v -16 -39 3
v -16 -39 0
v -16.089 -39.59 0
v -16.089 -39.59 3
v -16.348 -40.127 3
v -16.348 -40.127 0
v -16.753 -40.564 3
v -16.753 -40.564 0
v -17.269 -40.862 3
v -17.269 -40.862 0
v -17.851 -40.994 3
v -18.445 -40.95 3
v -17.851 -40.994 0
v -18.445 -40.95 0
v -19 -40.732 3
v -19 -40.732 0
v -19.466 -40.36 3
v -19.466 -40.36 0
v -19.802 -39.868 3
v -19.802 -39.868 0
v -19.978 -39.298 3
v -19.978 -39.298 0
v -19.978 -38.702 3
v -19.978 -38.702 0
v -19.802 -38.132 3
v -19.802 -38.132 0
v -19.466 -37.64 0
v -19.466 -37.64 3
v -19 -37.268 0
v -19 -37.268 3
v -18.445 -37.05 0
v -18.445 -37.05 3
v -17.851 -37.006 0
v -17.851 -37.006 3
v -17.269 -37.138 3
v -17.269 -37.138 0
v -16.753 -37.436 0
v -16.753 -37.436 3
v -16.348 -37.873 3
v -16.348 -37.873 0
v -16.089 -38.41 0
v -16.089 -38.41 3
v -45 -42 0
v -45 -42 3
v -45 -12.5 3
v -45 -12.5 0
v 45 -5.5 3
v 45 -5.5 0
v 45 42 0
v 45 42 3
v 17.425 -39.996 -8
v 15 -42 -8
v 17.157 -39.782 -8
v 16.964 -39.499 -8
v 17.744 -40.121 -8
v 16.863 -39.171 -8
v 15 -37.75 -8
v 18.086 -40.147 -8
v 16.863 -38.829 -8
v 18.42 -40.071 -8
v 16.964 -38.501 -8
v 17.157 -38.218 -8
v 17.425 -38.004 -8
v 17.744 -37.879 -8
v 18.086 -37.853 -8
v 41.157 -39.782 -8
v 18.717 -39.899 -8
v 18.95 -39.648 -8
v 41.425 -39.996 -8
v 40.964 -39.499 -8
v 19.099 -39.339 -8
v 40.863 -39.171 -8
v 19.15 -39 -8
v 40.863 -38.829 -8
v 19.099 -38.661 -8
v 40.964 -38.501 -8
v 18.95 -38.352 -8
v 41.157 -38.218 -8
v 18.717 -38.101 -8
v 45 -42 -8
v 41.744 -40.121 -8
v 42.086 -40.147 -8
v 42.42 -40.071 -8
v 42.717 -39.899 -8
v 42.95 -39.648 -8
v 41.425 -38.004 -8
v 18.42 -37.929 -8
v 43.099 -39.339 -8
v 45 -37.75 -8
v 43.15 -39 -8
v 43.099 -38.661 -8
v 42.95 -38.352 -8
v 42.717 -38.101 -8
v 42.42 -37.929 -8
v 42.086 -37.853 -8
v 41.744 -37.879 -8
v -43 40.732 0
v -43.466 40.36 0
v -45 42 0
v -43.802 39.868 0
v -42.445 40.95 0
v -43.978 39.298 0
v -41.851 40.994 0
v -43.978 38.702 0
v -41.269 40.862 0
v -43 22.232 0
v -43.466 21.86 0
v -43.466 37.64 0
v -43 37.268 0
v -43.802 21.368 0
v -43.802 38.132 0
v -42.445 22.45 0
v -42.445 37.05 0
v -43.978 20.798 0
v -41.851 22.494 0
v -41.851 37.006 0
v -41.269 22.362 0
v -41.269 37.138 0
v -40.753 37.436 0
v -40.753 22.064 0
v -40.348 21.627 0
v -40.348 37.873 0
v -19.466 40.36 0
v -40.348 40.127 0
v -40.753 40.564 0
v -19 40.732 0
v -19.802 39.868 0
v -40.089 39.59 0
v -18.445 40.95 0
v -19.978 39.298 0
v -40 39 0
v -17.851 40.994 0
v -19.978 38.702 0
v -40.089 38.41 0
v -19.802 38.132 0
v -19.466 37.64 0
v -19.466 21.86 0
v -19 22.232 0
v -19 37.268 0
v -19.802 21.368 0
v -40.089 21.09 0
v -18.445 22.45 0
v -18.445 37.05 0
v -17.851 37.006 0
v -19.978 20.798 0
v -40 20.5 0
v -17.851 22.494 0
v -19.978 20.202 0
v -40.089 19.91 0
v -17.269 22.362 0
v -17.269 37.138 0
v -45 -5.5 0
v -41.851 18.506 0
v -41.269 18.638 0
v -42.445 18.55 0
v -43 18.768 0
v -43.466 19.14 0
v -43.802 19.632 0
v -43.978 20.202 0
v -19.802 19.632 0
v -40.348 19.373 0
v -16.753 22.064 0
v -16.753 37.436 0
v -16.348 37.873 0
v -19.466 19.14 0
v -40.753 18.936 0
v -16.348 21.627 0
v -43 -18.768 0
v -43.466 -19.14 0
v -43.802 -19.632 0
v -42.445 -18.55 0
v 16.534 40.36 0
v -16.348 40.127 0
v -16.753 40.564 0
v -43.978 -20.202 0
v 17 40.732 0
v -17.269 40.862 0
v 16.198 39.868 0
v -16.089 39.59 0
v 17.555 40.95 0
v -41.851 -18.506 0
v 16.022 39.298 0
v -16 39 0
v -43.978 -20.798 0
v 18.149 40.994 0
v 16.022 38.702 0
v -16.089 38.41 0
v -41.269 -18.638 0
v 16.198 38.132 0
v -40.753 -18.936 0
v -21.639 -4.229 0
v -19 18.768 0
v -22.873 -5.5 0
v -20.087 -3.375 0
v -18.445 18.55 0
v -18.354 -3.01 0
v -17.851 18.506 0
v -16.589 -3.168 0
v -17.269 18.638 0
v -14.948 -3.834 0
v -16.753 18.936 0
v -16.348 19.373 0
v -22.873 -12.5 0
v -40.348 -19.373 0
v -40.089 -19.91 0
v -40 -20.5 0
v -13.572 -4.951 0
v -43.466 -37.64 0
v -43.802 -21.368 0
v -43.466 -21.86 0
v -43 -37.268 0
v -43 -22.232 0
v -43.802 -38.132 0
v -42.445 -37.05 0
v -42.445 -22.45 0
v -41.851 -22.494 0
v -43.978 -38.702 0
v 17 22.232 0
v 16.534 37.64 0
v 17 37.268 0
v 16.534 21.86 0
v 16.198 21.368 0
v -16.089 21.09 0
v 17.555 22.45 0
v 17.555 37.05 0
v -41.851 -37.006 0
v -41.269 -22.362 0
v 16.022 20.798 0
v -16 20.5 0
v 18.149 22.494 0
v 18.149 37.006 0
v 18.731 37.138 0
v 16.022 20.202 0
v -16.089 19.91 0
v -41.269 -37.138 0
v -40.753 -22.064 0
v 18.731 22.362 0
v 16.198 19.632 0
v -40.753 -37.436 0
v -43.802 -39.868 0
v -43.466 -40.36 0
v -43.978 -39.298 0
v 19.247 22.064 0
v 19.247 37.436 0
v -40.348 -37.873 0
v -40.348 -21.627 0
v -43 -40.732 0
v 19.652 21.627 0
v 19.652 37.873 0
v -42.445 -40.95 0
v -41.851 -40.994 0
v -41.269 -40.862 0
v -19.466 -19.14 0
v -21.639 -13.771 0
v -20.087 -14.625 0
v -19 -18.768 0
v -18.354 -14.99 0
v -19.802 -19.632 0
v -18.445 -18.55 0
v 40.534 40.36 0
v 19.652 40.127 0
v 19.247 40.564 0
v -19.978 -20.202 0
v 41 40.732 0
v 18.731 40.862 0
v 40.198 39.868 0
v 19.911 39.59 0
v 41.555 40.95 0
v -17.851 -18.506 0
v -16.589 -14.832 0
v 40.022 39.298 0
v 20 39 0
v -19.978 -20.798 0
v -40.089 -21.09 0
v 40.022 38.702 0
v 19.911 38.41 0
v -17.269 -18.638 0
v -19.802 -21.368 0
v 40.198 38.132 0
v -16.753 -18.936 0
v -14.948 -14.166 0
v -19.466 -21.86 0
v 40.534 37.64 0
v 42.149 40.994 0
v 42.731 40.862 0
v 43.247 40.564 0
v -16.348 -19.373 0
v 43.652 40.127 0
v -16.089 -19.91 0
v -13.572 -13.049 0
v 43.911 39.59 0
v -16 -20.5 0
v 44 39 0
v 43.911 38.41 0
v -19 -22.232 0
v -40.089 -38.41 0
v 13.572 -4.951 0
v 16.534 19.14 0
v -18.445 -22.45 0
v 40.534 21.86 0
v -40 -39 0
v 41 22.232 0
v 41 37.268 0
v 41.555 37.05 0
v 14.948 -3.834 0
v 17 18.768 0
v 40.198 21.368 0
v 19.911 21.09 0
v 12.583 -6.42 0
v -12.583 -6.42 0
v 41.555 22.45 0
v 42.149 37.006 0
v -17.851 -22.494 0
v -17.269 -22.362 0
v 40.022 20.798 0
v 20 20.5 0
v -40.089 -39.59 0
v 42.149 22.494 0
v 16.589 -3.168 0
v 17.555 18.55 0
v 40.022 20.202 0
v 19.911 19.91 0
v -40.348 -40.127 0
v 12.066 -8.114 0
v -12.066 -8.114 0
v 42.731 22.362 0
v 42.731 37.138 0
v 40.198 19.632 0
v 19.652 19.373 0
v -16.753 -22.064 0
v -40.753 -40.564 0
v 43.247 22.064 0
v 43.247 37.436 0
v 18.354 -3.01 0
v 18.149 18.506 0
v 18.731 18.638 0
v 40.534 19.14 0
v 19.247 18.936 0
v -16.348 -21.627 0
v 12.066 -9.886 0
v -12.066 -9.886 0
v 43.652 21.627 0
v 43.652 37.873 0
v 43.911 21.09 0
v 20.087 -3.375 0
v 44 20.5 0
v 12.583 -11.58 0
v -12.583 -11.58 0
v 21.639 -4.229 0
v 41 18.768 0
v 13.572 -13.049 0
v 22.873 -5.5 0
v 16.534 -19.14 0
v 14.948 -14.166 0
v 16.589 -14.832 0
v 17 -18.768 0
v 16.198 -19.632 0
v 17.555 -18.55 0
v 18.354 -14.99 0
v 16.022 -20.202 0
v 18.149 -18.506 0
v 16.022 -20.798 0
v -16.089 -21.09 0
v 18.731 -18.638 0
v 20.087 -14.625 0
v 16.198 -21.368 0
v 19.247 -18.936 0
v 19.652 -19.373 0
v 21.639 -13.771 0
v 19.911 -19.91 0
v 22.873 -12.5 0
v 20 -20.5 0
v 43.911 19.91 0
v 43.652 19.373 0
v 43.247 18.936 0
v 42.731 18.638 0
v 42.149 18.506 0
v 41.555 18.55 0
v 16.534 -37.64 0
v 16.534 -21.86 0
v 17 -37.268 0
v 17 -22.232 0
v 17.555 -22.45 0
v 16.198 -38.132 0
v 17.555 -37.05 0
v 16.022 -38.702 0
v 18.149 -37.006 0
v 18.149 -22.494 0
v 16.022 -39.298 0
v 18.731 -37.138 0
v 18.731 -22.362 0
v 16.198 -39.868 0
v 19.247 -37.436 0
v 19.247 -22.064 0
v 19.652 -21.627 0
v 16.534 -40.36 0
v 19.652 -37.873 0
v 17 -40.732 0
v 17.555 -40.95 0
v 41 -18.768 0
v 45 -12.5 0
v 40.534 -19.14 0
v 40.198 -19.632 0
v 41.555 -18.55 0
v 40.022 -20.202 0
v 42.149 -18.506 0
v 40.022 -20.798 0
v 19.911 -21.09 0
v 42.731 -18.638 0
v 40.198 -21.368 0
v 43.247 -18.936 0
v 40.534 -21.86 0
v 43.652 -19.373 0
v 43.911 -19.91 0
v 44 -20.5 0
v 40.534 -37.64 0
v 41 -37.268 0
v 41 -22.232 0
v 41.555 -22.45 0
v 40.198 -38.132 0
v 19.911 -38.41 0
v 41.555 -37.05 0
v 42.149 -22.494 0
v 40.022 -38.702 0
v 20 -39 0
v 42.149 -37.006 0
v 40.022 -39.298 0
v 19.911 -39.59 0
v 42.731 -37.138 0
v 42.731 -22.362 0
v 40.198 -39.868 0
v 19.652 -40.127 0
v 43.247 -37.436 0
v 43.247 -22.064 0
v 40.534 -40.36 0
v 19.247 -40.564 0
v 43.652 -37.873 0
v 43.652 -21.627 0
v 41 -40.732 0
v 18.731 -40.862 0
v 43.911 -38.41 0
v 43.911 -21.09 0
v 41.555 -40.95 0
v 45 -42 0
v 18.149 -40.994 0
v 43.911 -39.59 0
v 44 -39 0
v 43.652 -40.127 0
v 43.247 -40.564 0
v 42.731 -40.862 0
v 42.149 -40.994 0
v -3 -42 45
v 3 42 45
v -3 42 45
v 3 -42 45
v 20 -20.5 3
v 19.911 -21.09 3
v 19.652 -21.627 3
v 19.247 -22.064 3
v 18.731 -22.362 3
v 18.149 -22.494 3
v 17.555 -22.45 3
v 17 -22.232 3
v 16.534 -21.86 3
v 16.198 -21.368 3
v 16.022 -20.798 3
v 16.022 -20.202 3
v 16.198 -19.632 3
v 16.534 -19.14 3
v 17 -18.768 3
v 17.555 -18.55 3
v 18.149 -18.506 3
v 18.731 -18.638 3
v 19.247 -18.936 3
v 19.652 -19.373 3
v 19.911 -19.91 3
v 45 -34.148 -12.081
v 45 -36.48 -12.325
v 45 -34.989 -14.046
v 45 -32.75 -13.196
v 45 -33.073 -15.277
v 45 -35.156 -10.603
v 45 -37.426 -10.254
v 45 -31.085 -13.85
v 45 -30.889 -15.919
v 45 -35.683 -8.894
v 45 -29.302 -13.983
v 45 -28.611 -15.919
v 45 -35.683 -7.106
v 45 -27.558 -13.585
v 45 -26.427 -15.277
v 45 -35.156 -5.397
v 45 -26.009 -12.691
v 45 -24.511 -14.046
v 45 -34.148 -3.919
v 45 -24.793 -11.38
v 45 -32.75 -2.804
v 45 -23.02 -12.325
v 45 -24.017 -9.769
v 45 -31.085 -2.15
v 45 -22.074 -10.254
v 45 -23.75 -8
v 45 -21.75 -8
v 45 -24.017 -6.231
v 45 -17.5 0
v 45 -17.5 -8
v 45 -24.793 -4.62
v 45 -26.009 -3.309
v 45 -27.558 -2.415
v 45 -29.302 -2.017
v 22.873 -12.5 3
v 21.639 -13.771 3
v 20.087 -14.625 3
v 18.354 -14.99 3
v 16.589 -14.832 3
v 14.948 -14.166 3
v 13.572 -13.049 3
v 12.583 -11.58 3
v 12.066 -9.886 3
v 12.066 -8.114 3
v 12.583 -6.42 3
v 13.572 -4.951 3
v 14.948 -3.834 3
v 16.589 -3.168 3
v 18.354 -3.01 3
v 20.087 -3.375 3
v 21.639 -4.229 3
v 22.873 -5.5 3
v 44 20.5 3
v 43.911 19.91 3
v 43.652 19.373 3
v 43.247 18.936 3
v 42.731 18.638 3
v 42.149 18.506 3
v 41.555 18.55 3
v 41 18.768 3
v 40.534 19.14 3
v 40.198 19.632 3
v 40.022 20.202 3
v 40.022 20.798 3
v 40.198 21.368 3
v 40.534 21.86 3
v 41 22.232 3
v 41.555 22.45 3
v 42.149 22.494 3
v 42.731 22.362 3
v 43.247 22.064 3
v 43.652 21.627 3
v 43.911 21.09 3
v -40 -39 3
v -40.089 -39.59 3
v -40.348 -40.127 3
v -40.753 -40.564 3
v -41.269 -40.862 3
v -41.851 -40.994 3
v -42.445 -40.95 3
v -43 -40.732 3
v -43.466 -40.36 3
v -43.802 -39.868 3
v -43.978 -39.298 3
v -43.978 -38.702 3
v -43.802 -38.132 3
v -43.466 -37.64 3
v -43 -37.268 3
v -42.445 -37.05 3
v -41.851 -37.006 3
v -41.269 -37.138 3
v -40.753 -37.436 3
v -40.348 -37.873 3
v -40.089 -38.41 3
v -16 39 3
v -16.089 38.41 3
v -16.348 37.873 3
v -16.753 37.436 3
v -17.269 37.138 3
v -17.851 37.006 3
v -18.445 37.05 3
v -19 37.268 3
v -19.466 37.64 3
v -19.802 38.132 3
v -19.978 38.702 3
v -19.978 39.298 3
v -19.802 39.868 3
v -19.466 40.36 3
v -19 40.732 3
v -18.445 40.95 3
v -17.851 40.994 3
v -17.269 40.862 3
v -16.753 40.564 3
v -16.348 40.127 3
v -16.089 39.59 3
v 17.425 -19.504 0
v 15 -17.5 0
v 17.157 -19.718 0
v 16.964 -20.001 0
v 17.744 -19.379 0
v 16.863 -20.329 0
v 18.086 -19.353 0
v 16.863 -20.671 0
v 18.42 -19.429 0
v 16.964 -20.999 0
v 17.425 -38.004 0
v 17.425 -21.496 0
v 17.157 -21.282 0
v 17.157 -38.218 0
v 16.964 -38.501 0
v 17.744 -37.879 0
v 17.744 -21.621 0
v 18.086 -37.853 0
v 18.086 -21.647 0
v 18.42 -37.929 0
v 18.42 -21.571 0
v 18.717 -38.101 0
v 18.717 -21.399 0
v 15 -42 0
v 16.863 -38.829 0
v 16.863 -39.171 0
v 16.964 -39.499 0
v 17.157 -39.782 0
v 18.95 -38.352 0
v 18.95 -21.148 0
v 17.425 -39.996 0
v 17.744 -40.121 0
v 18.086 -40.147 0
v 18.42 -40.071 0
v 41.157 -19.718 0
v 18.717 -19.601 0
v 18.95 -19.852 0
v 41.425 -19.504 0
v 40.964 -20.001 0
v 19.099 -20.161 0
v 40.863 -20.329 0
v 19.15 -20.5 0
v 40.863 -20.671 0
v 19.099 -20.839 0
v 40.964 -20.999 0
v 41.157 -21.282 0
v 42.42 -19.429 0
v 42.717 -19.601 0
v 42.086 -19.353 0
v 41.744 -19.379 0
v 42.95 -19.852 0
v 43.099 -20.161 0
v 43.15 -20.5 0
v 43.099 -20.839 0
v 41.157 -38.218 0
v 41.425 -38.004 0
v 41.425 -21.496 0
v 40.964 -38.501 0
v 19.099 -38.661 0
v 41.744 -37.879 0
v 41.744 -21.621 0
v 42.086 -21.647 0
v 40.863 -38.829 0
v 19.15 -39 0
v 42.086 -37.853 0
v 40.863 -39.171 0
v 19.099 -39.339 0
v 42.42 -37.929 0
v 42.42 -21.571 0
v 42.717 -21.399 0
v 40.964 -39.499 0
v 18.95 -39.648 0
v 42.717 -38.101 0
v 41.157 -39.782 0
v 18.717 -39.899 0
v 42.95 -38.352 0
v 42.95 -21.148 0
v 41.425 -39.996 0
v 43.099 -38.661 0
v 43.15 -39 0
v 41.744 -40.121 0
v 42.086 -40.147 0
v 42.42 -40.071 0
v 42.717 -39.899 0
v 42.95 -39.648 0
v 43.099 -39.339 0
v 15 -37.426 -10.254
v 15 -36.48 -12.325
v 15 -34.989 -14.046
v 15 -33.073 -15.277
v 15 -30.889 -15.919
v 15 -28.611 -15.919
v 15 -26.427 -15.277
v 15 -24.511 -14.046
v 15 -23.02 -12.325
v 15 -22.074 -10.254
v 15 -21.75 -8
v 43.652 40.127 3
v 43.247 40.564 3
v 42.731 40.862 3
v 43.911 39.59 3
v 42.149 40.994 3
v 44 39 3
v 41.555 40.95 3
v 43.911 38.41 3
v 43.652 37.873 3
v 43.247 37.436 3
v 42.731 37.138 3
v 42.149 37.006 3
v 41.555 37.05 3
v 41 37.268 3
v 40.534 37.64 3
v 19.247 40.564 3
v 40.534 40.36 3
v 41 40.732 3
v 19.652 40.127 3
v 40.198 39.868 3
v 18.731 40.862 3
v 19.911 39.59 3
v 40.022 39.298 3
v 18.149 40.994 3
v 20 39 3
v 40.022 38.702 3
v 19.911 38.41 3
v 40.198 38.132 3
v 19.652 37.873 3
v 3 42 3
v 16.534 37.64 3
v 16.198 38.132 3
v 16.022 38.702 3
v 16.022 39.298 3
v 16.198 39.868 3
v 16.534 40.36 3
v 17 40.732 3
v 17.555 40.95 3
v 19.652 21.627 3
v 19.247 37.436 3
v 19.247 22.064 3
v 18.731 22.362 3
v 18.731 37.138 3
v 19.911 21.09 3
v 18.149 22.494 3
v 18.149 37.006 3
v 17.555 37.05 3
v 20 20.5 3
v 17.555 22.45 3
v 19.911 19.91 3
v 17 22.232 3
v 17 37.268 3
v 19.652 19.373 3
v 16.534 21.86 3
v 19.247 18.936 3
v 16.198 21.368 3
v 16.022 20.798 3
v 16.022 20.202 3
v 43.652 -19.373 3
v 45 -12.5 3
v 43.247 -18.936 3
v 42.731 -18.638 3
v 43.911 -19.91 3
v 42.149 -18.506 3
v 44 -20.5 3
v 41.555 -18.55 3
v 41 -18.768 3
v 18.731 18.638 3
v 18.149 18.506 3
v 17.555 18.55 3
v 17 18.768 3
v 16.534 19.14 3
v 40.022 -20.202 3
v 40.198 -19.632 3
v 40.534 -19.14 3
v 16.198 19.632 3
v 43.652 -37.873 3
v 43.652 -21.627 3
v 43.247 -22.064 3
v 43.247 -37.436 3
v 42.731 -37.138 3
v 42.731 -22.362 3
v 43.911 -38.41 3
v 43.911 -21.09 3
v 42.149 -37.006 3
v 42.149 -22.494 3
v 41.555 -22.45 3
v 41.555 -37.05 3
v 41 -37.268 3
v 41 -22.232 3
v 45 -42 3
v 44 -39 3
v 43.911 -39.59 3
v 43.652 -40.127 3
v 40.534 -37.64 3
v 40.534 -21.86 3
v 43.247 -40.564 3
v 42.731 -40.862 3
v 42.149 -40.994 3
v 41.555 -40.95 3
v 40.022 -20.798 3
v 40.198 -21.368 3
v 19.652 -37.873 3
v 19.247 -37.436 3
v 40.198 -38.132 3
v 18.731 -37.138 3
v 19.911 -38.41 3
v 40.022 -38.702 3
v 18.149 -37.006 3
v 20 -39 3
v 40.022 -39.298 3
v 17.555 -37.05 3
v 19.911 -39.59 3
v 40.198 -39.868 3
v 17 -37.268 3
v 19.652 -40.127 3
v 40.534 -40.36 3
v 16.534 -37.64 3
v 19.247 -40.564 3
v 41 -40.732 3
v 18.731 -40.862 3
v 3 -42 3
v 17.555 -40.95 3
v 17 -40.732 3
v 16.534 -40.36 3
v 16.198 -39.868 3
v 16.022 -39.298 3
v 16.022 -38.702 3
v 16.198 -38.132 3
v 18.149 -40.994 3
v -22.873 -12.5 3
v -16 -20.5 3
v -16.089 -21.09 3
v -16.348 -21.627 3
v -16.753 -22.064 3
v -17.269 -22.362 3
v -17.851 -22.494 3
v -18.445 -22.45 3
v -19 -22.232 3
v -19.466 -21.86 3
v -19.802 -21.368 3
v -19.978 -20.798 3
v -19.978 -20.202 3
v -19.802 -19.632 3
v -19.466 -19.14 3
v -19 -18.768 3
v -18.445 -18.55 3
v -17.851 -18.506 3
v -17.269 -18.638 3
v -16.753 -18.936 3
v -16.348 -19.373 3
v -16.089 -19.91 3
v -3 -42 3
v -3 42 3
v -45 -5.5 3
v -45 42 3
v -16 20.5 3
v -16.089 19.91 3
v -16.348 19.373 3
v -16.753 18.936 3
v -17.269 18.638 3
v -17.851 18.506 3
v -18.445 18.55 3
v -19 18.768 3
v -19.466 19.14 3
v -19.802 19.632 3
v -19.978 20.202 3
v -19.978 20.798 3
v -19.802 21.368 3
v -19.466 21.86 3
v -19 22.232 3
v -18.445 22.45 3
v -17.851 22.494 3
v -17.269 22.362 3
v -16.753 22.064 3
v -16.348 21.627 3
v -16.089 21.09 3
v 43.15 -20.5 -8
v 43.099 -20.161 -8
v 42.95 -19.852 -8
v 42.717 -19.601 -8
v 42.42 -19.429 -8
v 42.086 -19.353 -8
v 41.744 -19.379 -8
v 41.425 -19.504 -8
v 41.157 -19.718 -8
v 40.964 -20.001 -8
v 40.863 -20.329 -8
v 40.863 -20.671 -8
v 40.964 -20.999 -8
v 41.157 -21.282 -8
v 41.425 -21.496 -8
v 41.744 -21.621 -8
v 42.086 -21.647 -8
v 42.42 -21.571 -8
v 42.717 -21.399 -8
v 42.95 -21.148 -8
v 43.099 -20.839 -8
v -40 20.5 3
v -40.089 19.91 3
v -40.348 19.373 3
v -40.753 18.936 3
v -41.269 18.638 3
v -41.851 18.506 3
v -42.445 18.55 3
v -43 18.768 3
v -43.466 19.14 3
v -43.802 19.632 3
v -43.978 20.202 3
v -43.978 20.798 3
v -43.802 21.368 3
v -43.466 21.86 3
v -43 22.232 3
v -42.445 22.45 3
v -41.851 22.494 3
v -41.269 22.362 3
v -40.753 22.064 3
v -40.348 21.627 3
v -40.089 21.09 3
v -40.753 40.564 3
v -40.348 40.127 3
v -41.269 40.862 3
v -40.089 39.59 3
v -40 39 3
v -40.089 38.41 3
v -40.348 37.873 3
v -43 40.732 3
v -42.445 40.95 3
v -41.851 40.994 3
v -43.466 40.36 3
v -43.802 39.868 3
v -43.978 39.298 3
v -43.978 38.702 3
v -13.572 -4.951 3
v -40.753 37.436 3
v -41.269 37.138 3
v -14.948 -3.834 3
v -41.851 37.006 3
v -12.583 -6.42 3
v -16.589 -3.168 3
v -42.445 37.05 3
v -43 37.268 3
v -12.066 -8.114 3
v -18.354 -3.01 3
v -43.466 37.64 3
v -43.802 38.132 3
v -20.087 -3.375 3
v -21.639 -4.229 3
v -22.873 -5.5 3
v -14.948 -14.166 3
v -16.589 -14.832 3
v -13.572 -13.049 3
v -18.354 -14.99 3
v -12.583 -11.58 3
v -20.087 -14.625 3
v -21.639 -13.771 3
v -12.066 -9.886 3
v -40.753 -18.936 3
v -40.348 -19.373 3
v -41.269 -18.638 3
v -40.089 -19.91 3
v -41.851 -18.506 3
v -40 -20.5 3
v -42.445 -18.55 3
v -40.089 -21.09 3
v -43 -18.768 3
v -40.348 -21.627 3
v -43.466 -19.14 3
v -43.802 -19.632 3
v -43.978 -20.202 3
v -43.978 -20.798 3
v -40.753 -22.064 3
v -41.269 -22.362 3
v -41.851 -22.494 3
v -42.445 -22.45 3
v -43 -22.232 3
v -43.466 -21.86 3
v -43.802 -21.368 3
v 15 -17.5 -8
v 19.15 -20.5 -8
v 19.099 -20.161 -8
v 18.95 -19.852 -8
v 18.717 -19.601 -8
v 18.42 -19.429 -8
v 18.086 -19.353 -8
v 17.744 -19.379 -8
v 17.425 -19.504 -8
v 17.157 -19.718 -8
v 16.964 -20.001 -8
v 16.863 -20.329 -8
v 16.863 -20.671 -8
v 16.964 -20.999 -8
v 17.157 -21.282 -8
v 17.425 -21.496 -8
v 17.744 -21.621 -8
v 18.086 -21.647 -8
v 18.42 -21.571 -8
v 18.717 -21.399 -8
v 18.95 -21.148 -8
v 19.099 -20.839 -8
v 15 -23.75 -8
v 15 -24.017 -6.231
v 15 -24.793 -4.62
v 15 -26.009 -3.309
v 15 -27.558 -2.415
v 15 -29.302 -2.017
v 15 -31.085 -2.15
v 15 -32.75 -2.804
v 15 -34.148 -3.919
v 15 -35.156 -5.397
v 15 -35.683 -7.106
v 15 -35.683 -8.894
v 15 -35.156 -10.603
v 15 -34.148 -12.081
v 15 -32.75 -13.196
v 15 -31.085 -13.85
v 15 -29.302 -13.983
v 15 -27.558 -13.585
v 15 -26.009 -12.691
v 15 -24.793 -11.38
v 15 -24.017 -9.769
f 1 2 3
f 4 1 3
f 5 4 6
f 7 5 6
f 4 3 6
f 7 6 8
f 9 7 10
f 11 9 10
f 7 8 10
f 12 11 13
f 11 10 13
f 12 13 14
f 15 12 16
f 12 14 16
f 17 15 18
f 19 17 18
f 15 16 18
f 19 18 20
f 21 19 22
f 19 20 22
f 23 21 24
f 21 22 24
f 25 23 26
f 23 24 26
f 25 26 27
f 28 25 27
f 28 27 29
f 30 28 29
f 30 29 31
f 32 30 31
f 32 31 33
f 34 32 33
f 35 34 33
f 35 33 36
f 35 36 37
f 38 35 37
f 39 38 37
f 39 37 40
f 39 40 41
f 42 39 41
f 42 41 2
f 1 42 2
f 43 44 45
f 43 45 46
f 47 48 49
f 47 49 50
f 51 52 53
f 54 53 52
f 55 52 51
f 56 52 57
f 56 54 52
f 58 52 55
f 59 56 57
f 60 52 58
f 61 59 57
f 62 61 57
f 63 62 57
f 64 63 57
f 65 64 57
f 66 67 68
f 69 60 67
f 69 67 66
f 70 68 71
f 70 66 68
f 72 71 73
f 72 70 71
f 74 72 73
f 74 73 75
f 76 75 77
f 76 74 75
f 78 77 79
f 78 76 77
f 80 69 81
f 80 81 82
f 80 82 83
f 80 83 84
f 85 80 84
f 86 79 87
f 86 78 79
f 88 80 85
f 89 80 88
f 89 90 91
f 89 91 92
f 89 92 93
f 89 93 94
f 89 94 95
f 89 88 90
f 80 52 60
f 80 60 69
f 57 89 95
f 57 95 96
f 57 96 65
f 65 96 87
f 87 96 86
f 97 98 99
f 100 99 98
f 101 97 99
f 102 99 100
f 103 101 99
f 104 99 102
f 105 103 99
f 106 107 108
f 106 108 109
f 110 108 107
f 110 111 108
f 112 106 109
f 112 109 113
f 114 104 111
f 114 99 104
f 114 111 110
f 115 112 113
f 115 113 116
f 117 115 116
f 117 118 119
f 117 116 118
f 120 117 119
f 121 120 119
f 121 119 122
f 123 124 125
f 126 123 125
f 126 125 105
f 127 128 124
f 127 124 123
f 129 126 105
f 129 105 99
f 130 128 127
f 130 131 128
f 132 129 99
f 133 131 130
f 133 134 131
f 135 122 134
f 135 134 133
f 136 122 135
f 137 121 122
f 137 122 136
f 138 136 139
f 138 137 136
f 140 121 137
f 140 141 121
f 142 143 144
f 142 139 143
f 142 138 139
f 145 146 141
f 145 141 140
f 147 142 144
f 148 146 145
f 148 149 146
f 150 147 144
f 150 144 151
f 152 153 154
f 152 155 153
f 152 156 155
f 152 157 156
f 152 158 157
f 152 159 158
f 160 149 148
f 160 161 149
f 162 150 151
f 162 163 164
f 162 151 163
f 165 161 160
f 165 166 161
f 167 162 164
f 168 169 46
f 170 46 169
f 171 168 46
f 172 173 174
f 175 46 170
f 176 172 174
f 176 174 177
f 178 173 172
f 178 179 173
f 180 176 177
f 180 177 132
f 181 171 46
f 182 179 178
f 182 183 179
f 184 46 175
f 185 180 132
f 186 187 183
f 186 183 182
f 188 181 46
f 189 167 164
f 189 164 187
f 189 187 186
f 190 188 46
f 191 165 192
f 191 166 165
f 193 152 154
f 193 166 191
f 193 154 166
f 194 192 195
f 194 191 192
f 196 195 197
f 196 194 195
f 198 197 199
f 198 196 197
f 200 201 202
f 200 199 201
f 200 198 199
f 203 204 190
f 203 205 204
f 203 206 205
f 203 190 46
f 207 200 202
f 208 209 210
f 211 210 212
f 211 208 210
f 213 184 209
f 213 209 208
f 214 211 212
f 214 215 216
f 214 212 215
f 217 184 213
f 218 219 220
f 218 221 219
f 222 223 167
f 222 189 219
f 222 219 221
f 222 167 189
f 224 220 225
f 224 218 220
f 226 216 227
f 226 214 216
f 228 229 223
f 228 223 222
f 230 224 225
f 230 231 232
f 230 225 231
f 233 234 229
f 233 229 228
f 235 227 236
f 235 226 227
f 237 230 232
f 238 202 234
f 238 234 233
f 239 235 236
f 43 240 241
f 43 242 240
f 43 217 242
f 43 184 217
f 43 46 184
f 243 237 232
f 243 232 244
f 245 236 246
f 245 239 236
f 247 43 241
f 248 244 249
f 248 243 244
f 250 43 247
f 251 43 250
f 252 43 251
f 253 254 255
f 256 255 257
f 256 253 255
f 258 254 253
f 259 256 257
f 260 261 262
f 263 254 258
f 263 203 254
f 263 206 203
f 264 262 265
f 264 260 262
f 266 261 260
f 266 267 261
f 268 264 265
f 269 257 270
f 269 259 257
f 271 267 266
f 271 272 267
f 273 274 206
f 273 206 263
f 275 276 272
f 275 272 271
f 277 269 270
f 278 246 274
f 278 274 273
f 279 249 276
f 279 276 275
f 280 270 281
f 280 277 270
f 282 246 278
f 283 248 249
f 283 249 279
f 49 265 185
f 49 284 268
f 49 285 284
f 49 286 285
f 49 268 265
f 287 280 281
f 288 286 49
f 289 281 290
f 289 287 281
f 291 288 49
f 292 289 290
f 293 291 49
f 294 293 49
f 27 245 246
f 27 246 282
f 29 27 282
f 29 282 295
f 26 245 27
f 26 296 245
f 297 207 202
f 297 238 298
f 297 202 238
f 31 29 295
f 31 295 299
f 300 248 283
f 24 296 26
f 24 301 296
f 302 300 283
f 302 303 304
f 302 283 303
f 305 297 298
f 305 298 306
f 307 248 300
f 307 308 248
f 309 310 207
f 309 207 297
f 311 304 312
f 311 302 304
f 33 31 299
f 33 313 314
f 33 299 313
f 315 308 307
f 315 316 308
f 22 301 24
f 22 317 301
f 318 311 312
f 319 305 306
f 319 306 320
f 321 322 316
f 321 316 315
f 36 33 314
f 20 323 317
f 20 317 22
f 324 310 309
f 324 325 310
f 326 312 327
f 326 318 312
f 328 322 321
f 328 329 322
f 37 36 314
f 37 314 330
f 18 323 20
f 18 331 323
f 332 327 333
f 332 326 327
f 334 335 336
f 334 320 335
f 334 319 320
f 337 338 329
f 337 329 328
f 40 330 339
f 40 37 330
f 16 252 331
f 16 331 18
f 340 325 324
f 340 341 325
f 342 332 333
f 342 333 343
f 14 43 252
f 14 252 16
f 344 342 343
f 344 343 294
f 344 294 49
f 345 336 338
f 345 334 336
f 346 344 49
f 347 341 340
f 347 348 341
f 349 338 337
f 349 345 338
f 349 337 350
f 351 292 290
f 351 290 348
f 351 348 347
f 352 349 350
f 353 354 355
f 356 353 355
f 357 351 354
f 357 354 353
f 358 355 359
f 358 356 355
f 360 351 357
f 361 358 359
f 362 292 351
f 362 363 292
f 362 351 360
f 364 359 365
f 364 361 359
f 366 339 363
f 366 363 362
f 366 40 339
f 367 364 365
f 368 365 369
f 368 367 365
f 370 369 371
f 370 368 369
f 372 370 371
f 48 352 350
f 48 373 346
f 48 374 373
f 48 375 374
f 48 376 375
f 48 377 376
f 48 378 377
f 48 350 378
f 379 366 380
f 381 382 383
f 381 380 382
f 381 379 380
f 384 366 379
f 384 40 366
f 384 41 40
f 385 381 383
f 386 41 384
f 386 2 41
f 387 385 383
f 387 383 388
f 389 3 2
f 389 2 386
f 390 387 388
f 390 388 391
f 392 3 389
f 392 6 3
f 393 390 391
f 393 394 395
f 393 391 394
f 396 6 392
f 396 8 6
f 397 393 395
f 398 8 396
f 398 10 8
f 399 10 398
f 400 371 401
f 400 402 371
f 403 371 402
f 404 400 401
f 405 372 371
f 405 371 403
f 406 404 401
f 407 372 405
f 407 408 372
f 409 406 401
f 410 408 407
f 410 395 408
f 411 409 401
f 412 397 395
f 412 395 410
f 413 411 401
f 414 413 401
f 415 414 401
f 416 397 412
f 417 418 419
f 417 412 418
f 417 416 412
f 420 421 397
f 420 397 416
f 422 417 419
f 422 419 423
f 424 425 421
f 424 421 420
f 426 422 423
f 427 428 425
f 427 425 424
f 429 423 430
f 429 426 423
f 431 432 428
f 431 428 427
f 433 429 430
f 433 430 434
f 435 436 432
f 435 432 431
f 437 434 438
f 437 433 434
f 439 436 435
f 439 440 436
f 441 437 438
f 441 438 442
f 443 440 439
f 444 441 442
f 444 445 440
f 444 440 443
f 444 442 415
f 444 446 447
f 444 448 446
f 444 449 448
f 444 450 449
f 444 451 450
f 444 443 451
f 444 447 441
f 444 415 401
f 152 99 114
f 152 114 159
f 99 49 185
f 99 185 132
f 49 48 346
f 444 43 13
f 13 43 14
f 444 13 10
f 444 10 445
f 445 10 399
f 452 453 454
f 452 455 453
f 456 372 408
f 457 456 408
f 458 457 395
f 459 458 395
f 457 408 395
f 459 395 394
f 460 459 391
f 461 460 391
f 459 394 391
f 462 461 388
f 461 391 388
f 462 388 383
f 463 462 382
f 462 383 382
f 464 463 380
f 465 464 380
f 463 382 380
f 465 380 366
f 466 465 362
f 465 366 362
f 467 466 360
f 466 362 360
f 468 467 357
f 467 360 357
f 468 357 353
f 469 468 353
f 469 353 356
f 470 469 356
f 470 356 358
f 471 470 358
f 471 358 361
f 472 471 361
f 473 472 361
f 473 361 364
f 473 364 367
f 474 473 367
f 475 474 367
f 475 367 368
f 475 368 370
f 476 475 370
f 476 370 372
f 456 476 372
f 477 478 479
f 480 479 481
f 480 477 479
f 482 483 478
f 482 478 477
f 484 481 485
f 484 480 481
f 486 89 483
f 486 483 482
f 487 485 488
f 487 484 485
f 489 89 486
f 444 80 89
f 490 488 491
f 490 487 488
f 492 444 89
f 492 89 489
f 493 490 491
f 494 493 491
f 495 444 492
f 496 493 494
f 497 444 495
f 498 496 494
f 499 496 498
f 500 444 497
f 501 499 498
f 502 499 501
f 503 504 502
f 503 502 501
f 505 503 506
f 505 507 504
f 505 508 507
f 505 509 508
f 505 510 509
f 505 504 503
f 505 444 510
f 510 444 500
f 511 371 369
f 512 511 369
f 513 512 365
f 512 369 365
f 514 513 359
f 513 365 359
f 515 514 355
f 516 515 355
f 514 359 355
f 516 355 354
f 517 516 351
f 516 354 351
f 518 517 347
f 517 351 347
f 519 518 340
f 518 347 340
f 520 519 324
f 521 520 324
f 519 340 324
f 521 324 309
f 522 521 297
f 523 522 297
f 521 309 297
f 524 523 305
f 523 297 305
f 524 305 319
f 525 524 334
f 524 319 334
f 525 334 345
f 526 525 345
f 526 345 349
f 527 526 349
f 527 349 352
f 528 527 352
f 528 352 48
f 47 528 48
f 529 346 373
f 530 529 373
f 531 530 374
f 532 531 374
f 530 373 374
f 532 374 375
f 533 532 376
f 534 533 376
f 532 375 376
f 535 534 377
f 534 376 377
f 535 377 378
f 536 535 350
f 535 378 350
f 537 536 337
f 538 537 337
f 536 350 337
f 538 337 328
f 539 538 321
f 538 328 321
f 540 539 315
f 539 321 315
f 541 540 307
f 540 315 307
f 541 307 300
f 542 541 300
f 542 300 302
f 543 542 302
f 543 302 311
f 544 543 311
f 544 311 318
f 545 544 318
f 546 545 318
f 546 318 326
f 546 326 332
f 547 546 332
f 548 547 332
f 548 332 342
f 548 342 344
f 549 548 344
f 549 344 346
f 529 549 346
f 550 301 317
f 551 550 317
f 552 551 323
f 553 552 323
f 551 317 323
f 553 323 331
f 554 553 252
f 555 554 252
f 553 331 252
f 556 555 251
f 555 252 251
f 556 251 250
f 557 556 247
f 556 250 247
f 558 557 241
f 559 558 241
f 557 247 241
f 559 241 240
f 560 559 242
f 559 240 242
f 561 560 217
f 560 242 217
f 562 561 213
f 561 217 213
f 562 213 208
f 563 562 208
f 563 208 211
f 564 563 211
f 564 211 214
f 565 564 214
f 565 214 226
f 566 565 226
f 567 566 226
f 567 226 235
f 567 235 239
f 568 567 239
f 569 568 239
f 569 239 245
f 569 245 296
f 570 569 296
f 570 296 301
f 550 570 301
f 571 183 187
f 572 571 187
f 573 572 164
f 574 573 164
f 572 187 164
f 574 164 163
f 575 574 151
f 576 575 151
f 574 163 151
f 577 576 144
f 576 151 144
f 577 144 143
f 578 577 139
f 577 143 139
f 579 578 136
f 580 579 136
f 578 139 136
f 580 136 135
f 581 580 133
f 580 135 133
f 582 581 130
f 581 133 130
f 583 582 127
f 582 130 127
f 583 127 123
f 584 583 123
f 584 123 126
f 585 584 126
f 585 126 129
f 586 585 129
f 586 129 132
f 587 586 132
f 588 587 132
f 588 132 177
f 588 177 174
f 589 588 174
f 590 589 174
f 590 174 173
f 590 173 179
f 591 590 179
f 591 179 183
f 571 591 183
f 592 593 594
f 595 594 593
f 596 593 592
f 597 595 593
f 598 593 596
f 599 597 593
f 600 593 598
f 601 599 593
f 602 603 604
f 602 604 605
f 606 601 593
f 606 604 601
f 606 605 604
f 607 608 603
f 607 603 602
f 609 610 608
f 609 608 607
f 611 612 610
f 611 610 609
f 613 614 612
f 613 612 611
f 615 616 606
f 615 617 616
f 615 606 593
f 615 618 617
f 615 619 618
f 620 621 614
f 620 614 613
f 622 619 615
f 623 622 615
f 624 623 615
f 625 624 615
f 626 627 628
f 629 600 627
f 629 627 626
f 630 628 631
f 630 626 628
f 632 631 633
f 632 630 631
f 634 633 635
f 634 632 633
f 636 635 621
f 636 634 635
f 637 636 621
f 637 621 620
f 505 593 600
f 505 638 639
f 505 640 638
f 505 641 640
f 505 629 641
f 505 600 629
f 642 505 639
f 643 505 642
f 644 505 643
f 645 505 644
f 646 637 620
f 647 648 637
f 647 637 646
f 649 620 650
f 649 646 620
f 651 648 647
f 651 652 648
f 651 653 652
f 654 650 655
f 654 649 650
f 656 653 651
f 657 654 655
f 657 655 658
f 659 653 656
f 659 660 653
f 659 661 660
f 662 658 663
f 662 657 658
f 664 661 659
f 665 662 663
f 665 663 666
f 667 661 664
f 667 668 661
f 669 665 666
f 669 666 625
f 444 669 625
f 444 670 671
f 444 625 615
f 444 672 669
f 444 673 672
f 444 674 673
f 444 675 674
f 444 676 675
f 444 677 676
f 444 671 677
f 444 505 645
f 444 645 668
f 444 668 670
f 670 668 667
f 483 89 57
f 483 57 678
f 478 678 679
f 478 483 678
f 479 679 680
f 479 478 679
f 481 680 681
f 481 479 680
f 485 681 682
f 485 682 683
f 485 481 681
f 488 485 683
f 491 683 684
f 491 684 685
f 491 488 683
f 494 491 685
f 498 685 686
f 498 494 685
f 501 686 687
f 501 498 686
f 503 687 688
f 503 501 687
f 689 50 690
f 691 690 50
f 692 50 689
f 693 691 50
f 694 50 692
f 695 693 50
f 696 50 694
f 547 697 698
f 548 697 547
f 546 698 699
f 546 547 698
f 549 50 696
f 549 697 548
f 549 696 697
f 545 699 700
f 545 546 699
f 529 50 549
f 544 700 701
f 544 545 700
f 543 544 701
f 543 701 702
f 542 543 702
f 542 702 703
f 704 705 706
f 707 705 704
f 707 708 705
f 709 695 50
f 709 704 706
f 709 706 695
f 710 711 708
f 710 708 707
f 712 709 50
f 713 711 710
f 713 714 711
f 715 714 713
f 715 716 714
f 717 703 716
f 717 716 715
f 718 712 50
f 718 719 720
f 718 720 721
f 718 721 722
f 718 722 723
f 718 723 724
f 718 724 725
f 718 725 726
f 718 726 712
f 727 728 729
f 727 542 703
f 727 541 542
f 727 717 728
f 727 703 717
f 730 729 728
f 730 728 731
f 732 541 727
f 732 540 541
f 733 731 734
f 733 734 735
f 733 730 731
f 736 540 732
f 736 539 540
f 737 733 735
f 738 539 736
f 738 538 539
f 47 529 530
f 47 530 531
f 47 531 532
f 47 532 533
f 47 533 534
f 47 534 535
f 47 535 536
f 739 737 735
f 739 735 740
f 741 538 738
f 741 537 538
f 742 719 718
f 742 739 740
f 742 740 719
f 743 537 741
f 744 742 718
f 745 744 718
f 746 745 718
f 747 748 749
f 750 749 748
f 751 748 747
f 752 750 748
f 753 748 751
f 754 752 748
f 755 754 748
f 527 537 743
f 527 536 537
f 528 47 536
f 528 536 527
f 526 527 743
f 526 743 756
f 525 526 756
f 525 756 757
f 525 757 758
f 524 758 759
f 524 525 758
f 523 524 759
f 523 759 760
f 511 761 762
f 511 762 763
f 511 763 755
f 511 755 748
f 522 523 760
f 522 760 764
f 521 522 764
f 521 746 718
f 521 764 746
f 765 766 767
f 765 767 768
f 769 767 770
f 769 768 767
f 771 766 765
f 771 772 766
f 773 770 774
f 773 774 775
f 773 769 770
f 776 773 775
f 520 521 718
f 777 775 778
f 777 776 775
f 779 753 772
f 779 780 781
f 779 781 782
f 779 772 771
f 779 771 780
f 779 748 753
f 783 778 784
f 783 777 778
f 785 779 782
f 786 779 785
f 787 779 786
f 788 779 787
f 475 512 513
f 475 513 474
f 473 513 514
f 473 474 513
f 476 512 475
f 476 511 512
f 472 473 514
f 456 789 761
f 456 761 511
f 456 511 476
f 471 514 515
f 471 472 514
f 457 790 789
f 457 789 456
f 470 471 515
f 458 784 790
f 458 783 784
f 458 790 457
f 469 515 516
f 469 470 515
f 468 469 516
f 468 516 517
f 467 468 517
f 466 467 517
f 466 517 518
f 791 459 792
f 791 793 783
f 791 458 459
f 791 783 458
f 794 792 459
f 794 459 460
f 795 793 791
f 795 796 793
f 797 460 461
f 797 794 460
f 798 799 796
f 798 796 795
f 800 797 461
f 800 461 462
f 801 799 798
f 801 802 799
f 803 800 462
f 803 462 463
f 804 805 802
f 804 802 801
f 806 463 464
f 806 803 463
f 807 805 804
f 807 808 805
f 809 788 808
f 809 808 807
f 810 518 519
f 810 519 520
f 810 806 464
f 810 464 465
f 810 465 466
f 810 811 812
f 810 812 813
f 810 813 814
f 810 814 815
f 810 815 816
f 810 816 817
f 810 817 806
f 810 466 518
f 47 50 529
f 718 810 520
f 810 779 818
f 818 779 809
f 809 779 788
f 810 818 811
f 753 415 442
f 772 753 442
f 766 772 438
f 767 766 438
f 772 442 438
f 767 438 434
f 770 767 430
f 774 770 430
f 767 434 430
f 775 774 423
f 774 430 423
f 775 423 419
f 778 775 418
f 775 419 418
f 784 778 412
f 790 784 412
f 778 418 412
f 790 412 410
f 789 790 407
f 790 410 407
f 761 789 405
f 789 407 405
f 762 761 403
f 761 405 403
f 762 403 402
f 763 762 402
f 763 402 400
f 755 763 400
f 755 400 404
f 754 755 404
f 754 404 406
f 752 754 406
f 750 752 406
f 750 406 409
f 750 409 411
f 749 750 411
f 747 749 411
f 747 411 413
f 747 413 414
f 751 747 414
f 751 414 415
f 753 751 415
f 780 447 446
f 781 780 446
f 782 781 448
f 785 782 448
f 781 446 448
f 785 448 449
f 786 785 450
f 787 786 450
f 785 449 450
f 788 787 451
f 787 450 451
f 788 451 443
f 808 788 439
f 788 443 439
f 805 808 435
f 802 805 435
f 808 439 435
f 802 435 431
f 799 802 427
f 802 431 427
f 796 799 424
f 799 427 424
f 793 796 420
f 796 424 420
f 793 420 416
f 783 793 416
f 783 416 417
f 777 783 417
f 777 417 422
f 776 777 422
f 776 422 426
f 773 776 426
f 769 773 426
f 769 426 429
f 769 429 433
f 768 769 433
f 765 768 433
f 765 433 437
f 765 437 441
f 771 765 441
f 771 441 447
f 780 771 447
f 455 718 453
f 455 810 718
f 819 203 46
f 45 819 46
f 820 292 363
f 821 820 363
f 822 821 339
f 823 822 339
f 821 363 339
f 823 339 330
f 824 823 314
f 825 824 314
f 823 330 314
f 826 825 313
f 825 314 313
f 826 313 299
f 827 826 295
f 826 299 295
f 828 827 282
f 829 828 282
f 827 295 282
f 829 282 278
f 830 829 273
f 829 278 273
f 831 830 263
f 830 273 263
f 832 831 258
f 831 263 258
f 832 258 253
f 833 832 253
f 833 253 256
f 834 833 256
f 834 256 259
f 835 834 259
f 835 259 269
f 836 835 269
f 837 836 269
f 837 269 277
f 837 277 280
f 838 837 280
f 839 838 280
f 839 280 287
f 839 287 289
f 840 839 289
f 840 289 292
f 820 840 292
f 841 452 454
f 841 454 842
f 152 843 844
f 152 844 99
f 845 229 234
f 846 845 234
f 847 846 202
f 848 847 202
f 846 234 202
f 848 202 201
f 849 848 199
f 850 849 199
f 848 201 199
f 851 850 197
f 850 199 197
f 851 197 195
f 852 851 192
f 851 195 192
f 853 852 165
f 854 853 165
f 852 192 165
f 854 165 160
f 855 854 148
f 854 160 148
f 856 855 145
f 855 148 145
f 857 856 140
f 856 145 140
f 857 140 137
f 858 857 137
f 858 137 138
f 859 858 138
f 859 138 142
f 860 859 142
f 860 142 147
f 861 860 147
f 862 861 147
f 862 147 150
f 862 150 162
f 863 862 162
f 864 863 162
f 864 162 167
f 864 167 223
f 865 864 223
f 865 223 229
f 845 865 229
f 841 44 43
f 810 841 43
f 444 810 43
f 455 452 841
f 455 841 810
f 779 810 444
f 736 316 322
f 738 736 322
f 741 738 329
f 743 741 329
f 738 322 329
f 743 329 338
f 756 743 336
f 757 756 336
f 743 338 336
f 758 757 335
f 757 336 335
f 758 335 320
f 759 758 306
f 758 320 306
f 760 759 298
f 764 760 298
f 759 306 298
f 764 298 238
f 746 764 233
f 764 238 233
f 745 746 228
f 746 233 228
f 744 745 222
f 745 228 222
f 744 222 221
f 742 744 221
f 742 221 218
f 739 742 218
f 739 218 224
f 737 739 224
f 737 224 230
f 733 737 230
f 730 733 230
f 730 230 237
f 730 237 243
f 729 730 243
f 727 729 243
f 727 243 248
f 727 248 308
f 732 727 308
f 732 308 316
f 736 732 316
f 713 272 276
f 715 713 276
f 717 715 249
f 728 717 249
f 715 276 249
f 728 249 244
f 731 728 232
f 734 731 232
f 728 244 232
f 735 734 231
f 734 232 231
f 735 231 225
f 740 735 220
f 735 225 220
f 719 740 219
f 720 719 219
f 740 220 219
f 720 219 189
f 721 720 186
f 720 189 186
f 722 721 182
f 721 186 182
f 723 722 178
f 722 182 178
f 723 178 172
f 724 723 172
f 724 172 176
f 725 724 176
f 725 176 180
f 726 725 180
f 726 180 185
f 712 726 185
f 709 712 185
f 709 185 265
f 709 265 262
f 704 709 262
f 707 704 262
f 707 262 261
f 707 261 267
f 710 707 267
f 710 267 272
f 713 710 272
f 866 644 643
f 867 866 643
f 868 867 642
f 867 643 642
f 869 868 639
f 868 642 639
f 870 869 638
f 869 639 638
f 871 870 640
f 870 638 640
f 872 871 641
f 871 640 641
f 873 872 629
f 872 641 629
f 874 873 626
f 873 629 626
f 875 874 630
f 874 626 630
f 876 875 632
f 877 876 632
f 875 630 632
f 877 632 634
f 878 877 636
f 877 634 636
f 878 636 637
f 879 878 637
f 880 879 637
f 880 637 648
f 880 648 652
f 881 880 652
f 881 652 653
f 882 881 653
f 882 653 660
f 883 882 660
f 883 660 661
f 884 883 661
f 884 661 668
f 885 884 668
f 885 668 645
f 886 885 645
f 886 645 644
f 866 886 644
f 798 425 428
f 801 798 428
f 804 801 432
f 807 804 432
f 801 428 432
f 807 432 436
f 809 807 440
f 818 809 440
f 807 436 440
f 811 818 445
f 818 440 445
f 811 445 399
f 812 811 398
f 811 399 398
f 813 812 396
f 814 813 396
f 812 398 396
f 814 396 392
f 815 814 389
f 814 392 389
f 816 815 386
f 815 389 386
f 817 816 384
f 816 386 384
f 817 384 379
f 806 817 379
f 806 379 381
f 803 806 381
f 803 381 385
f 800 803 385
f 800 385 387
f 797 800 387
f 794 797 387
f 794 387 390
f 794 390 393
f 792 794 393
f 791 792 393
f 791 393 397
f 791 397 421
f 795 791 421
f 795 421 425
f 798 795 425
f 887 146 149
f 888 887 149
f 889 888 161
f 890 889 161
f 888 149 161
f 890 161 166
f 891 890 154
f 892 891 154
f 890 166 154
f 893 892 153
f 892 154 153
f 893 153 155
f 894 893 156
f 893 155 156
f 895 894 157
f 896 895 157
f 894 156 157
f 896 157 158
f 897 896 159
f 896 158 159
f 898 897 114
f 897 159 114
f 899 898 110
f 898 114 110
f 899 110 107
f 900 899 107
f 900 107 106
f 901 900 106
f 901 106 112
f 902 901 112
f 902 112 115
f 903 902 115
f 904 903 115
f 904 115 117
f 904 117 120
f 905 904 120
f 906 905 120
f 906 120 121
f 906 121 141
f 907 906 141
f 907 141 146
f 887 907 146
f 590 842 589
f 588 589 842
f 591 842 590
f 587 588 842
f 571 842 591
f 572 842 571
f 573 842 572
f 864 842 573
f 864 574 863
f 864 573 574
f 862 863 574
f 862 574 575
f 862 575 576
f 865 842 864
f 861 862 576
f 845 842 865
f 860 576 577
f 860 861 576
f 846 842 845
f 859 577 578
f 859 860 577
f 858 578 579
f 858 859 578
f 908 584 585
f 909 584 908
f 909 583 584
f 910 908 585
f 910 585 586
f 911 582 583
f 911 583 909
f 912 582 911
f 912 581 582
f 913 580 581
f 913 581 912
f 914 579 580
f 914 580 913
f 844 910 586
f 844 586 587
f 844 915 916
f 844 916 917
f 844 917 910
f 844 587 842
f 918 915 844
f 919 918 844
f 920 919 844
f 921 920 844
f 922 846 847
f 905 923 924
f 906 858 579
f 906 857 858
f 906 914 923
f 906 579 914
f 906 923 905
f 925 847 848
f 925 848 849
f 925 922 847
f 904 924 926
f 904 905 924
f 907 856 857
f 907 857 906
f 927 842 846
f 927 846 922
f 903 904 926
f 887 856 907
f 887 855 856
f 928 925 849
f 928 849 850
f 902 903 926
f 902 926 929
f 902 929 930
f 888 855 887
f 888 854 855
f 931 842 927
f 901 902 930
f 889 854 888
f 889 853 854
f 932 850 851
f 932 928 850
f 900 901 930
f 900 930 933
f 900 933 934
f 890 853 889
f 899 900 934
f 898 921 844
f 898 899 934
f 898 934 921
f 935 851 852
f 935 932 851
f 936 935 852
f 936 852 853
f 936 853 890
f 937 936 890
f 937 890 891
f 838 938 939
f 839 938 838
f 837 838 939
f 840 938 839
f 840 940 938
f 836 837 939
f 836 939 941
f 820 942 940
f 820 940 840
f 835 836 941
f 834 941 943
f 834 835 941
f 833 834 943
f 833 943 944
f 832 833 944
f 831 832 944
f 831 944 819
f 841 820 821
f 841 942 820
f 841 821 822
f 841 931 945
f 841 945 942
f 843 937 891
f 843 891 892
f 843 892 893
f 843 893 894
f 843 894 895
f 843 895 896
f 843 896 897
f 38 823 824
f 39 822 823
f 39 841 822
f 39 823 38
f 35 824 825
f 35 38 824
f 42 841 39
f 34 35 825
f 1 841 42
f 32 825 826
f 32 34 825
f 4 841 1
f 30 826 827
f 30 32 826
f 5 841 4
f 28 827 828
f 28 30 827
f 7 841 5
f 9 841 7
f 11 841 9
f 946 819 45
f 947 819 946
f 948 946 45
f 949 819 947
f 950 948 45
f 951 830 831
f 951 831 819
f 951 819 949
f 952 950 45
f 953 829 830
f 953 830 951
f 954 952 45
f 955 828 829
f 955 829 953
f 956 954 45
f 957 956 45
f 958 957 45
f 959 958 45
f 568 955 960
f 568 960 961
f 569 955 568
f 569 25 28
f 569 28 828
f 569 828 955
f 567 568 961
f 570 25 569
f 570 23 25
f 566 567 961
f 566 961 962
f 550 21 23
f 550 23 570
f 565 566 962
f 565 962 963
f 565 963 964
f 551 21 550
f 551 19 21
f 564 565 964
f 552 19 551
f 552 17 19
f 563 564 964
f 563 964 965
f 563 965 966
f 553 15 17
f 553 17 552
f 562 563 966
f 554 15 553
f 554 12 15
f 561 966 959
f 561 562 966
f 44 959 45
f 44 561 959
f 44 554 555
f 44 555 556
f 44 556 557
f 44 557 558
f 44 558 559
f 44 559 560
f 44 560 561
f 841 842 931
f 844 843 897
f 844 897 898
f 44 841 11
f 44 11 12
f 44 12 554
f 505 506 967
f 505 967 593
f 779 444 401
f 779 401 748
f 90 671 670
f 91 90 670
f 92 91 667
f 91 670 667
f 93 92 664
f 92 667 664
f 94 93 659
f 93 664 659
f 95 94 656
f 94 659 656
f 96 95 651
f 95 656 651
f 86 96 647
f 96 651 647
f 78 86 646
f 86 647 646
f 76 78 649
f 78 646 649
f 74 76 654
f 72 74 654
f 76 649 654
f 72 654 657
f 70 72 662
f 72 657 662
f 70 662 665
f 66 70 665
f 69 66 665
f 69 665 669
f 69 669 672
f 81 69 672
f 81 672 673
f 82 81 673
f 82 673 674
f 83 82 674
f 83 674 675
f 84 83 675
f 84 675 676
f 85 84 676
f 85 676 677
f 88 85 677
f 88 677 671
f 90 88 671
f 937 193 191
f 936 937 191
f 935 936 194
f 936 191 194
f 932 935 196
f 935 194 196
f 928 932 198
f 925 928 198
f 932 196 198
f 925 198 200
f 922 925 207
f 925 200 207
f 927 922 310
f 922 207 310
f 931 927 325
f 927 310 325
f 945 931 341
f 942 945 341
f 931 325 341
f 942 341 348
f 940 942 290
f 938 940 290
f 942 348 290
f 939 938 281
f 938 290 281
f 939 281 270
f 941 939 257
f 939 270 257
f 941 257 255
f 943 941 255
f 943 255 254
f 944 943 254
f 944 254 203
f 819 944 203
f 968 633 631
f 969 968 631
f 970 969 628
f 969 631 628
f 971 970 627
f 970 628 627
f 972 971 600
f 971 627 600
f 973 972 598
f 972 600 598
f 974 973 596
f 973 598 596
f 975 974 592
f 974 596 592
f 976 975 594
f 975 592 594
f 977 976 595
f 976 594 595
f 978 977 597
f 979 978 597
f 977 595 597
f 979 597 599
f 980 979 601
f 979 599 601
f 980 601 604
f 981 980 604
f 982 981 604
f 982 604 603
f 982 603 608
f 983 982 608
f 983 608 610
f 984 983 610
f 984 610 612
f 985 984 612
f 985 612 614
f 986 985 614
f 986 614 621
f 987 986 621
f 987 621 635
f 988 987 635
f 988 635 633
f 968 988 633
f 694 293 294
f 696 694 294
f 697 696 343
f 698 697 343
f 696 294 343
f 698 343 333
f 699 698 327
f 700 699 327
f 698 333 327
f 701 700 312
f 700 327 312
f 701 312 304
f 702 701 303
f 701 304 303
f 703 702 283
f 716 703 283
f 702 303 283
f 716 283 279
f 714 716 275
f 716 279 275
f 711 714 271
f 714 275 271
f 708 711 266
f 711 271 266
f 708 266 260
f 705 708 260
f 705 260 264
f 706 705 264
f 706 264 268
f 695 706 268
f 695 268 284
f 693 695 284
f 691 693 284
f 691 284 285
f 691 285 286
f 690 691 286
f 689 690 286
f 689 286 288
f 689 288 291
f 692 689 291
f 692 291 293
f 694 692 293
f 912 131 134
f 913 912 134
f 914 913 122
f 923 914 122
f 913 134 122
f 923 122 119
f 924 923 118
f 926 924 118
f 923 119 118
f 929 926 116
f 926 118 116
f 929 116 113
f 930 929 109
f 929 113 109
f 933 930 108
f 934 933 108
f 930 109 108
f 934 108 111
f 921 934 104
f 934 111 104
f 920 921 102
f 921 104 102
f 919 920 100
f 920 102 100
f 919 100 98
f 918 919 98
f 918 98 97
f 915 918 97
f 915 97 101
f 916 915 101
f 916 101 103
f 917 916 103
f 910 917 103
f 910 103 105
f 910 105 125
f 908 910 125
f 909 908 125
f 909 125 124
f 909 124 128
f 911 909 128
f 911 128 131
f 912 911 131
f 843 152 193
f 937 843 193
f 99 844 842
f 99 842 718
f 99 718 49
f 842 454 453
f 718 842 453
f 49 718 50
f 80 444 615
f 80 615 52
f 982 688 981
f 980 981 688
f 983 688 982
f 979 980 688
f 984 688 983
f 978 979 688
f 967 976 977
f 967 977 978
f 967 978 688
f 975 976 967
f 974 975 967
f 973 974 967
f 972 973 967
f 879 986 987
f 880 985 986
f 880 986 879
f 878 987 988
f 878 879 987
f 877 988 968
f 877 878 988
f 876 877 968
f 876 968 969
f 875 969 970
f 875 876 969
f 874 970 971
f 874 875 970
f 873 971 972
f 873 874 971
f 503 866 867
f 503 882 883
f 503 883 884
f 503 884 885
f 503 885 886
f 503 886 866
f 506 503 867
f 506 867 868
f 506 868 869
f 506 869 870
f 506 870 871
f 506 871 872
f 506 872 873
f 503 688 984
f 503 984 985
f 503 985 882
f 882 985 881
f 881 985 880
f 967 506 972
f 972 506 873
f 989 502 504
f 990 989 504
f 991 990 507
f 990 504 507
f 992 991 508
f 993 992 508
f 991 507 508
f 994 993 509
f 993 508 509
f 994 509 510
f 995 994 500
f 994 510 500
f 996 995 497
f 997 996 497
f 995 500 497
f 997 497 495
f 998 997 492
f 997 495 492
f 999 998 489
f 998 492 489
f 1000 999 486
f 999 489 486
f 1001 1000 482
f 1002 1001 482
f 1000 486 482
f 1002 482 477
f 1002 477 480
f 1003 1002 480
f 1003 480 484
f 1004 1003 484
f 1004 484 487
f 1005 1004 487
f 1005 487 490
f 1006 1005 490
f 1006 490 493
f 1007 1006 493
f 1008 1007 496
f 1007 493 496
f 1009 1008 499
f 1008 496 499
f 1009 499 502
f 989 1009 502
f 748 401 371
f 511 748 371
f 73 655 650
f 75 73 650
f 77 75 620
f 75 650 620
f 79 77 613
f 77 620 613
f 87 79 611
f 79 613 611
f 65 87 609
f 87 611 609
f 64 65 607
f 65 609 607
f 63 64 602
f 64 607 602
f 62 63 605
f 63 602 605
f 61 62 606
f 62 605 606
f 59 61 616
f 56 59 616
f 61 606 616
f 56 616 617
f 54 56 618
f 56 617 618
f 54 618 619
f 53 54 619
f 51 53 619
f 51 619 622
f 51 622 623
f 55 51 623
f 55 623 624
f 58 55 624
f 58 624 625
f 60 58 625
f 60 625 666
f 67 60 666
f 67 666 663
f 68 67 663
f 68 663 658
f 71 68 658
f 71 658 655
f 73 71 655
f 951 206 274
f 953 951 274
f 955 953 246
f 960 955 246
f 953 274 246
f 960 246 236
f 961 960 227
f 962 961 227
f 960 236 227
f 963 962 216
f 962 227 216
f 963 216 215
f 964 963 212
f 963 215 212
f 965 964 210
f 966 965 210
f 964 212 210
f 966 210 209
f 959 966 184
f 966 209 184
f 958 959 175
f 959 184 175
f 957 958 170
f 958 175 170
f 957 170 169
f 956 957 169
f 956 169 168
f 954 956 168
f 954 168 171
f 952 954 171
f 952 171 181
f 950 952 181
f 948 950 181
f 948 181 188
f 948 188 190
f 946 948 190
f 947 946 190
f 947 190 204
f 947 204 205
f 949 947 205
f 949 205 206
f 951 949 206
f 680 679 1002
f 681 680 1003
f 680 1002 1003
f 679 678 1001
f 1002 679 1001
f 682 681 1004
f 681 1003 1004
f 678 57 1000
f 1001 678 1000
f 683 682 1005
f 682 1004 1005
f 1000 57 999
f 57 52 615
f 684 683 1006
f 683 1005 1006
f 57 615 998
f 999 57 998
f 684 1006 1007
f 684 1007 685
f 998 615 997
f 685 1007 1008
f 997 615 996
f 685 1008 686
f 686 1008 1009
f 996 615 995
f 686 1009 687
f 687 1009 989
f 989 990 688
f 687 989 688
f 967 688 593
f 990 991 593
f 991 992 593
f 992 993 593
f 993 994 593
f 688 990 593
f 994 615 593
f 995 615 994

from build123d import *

# Parameters (mm, degrees)
F1_DEPTH = 42
F3_DEPTH = 45.001
F4_R     = 6
F5_DEPTH = 30
F6_R     = 1.15
F7_DEPTH = 16.001
F8_R     = 2
F9_DEPTH = 45.001


with BuildPart() as f1:
    # F0 (on Front) → F1 (new body, symmetric)
    with BuildSketch(Plane.XZ):
        Polygon((3, 45), (0, 45), (0, 0), (45, 0), (45, 3), (3, 3), align=None)
        Polygon((0, 0), (0, 45), (-3, 45), (-3, 3), (-45, 3), (-45, 0), align=None)
    extrude(amount=F1_DEPTH, both=True)

    # F2 (on face) → F3 (cut, through all)
    with BuildSketch(Plane(origin=(0, 0, 0), x_dir=(1, 0, 0), z_dir=(0, 0, -1))):
        with BuildLine():
            Line((45, 12.5), (22.873397, 12.5))
            ThreePointArc((22.873397, 12.5), (12, 9), (22.873397, 5.5))
            Line((22.873397, 5.5), (45, 5.5))
            Line((45, 5.5), (45, 12.5))
        make_face()
        with BuildLine():
            ThreePointArc((-22.873397, 5.5), (-12, 9), (-22.873397, 12.5))
            Line((-22.873397, 12.5), (-45, 12.5))
            Line((-45, 12.5), (-45, 5.5))
            Line((-45, 5.5), (-22.873397, 5.5))
        make_face()
    extrude(amount=-F3_DEPTH, mode=Mode.SUBTRACT)

    # F8 (on face) → F9 (cut, through all)
    with BuildSketch(Plane(origin=(0, 0, 0), x_dir=(1, 0, 0), z_dir=(0, 0, -1))):
        with Locations((18, 20.5)):
            Circle(F8_R)
        with Locations((18, 39)):
            Circle(F8_R)
        with Locations((42, 20.5)):
            Circle(F8_R)
        with Locations((42, 39)):
            Circle(F8_R)
        with Locations((18, -20.5)):
            Circle(F8_R)
        with Locations((18, -39)):
            Circle(F8_R)
        with Locations((42, -20.5)):
            Circle(F8_R)
        with Locations((42, -39)):
            Circle(F8_R)
        with Locations((-42, -39)):
            Circle(F8_R)
        with Locations((-42, -20.5)):
            Circle(F8_R)
        with Locations((-18, -39)):
            Circle(F8_R)
        with Locations((-18, -20.5)):
            Circle(F8_R)
        with Locations((-42, 39)):
            Circle(F8_R)
        with Locations((-42, 20.5)):
            Circle(F8_R)
        with Locations((-18, 39)):
            Circle(F8_R)
        with Locations((-18, 20.5)):
            Circle(F8_R)
    extrude(amount=-F9_DEPTH, mode=Mode.SUBTRACT)


with BuildPart() as f5:
    # F4 (on face) → F5 (new body)
    with BuildSketch(Plane.YZ.offset(45)):
        with BuildLine():
            Line((-17.5, 0), (-42, 0))
            Line((-42, 0), (-42, -8))
            Line((-42, -8), (-37.75, -8))
            ThreePointArc((-37.75, -8), (-29.75, -16), (-21.75, -8))
            Line((-21.75, -8), (-17.5, -8))
            Line((-17.5, -8), (-17.5, 0))
        make_face()
        with Locations((-29.75, -8)):
            Circle(F4_R, mode=Mode.SUBTRACT)
    extrude(amount=-F5_DEPTH)

    # F6 (on face) → F7 (cut, through all)
    with BuildSketch(Plane.XY):
        with Locations((18, -20.5)):
            Circle(F6_R)
        with Locations((18, -39)):
            Circle(F6_R)
        with Locations((42, -20.5)):
            Circle(F6_R)
        with Locations((42, -39)):
            Circle(F6_R)
    extrude(amount=-F7_DEPTH, mode=Mode.SUBTRACT)


solid = Compound([f1.part, f5.part])
